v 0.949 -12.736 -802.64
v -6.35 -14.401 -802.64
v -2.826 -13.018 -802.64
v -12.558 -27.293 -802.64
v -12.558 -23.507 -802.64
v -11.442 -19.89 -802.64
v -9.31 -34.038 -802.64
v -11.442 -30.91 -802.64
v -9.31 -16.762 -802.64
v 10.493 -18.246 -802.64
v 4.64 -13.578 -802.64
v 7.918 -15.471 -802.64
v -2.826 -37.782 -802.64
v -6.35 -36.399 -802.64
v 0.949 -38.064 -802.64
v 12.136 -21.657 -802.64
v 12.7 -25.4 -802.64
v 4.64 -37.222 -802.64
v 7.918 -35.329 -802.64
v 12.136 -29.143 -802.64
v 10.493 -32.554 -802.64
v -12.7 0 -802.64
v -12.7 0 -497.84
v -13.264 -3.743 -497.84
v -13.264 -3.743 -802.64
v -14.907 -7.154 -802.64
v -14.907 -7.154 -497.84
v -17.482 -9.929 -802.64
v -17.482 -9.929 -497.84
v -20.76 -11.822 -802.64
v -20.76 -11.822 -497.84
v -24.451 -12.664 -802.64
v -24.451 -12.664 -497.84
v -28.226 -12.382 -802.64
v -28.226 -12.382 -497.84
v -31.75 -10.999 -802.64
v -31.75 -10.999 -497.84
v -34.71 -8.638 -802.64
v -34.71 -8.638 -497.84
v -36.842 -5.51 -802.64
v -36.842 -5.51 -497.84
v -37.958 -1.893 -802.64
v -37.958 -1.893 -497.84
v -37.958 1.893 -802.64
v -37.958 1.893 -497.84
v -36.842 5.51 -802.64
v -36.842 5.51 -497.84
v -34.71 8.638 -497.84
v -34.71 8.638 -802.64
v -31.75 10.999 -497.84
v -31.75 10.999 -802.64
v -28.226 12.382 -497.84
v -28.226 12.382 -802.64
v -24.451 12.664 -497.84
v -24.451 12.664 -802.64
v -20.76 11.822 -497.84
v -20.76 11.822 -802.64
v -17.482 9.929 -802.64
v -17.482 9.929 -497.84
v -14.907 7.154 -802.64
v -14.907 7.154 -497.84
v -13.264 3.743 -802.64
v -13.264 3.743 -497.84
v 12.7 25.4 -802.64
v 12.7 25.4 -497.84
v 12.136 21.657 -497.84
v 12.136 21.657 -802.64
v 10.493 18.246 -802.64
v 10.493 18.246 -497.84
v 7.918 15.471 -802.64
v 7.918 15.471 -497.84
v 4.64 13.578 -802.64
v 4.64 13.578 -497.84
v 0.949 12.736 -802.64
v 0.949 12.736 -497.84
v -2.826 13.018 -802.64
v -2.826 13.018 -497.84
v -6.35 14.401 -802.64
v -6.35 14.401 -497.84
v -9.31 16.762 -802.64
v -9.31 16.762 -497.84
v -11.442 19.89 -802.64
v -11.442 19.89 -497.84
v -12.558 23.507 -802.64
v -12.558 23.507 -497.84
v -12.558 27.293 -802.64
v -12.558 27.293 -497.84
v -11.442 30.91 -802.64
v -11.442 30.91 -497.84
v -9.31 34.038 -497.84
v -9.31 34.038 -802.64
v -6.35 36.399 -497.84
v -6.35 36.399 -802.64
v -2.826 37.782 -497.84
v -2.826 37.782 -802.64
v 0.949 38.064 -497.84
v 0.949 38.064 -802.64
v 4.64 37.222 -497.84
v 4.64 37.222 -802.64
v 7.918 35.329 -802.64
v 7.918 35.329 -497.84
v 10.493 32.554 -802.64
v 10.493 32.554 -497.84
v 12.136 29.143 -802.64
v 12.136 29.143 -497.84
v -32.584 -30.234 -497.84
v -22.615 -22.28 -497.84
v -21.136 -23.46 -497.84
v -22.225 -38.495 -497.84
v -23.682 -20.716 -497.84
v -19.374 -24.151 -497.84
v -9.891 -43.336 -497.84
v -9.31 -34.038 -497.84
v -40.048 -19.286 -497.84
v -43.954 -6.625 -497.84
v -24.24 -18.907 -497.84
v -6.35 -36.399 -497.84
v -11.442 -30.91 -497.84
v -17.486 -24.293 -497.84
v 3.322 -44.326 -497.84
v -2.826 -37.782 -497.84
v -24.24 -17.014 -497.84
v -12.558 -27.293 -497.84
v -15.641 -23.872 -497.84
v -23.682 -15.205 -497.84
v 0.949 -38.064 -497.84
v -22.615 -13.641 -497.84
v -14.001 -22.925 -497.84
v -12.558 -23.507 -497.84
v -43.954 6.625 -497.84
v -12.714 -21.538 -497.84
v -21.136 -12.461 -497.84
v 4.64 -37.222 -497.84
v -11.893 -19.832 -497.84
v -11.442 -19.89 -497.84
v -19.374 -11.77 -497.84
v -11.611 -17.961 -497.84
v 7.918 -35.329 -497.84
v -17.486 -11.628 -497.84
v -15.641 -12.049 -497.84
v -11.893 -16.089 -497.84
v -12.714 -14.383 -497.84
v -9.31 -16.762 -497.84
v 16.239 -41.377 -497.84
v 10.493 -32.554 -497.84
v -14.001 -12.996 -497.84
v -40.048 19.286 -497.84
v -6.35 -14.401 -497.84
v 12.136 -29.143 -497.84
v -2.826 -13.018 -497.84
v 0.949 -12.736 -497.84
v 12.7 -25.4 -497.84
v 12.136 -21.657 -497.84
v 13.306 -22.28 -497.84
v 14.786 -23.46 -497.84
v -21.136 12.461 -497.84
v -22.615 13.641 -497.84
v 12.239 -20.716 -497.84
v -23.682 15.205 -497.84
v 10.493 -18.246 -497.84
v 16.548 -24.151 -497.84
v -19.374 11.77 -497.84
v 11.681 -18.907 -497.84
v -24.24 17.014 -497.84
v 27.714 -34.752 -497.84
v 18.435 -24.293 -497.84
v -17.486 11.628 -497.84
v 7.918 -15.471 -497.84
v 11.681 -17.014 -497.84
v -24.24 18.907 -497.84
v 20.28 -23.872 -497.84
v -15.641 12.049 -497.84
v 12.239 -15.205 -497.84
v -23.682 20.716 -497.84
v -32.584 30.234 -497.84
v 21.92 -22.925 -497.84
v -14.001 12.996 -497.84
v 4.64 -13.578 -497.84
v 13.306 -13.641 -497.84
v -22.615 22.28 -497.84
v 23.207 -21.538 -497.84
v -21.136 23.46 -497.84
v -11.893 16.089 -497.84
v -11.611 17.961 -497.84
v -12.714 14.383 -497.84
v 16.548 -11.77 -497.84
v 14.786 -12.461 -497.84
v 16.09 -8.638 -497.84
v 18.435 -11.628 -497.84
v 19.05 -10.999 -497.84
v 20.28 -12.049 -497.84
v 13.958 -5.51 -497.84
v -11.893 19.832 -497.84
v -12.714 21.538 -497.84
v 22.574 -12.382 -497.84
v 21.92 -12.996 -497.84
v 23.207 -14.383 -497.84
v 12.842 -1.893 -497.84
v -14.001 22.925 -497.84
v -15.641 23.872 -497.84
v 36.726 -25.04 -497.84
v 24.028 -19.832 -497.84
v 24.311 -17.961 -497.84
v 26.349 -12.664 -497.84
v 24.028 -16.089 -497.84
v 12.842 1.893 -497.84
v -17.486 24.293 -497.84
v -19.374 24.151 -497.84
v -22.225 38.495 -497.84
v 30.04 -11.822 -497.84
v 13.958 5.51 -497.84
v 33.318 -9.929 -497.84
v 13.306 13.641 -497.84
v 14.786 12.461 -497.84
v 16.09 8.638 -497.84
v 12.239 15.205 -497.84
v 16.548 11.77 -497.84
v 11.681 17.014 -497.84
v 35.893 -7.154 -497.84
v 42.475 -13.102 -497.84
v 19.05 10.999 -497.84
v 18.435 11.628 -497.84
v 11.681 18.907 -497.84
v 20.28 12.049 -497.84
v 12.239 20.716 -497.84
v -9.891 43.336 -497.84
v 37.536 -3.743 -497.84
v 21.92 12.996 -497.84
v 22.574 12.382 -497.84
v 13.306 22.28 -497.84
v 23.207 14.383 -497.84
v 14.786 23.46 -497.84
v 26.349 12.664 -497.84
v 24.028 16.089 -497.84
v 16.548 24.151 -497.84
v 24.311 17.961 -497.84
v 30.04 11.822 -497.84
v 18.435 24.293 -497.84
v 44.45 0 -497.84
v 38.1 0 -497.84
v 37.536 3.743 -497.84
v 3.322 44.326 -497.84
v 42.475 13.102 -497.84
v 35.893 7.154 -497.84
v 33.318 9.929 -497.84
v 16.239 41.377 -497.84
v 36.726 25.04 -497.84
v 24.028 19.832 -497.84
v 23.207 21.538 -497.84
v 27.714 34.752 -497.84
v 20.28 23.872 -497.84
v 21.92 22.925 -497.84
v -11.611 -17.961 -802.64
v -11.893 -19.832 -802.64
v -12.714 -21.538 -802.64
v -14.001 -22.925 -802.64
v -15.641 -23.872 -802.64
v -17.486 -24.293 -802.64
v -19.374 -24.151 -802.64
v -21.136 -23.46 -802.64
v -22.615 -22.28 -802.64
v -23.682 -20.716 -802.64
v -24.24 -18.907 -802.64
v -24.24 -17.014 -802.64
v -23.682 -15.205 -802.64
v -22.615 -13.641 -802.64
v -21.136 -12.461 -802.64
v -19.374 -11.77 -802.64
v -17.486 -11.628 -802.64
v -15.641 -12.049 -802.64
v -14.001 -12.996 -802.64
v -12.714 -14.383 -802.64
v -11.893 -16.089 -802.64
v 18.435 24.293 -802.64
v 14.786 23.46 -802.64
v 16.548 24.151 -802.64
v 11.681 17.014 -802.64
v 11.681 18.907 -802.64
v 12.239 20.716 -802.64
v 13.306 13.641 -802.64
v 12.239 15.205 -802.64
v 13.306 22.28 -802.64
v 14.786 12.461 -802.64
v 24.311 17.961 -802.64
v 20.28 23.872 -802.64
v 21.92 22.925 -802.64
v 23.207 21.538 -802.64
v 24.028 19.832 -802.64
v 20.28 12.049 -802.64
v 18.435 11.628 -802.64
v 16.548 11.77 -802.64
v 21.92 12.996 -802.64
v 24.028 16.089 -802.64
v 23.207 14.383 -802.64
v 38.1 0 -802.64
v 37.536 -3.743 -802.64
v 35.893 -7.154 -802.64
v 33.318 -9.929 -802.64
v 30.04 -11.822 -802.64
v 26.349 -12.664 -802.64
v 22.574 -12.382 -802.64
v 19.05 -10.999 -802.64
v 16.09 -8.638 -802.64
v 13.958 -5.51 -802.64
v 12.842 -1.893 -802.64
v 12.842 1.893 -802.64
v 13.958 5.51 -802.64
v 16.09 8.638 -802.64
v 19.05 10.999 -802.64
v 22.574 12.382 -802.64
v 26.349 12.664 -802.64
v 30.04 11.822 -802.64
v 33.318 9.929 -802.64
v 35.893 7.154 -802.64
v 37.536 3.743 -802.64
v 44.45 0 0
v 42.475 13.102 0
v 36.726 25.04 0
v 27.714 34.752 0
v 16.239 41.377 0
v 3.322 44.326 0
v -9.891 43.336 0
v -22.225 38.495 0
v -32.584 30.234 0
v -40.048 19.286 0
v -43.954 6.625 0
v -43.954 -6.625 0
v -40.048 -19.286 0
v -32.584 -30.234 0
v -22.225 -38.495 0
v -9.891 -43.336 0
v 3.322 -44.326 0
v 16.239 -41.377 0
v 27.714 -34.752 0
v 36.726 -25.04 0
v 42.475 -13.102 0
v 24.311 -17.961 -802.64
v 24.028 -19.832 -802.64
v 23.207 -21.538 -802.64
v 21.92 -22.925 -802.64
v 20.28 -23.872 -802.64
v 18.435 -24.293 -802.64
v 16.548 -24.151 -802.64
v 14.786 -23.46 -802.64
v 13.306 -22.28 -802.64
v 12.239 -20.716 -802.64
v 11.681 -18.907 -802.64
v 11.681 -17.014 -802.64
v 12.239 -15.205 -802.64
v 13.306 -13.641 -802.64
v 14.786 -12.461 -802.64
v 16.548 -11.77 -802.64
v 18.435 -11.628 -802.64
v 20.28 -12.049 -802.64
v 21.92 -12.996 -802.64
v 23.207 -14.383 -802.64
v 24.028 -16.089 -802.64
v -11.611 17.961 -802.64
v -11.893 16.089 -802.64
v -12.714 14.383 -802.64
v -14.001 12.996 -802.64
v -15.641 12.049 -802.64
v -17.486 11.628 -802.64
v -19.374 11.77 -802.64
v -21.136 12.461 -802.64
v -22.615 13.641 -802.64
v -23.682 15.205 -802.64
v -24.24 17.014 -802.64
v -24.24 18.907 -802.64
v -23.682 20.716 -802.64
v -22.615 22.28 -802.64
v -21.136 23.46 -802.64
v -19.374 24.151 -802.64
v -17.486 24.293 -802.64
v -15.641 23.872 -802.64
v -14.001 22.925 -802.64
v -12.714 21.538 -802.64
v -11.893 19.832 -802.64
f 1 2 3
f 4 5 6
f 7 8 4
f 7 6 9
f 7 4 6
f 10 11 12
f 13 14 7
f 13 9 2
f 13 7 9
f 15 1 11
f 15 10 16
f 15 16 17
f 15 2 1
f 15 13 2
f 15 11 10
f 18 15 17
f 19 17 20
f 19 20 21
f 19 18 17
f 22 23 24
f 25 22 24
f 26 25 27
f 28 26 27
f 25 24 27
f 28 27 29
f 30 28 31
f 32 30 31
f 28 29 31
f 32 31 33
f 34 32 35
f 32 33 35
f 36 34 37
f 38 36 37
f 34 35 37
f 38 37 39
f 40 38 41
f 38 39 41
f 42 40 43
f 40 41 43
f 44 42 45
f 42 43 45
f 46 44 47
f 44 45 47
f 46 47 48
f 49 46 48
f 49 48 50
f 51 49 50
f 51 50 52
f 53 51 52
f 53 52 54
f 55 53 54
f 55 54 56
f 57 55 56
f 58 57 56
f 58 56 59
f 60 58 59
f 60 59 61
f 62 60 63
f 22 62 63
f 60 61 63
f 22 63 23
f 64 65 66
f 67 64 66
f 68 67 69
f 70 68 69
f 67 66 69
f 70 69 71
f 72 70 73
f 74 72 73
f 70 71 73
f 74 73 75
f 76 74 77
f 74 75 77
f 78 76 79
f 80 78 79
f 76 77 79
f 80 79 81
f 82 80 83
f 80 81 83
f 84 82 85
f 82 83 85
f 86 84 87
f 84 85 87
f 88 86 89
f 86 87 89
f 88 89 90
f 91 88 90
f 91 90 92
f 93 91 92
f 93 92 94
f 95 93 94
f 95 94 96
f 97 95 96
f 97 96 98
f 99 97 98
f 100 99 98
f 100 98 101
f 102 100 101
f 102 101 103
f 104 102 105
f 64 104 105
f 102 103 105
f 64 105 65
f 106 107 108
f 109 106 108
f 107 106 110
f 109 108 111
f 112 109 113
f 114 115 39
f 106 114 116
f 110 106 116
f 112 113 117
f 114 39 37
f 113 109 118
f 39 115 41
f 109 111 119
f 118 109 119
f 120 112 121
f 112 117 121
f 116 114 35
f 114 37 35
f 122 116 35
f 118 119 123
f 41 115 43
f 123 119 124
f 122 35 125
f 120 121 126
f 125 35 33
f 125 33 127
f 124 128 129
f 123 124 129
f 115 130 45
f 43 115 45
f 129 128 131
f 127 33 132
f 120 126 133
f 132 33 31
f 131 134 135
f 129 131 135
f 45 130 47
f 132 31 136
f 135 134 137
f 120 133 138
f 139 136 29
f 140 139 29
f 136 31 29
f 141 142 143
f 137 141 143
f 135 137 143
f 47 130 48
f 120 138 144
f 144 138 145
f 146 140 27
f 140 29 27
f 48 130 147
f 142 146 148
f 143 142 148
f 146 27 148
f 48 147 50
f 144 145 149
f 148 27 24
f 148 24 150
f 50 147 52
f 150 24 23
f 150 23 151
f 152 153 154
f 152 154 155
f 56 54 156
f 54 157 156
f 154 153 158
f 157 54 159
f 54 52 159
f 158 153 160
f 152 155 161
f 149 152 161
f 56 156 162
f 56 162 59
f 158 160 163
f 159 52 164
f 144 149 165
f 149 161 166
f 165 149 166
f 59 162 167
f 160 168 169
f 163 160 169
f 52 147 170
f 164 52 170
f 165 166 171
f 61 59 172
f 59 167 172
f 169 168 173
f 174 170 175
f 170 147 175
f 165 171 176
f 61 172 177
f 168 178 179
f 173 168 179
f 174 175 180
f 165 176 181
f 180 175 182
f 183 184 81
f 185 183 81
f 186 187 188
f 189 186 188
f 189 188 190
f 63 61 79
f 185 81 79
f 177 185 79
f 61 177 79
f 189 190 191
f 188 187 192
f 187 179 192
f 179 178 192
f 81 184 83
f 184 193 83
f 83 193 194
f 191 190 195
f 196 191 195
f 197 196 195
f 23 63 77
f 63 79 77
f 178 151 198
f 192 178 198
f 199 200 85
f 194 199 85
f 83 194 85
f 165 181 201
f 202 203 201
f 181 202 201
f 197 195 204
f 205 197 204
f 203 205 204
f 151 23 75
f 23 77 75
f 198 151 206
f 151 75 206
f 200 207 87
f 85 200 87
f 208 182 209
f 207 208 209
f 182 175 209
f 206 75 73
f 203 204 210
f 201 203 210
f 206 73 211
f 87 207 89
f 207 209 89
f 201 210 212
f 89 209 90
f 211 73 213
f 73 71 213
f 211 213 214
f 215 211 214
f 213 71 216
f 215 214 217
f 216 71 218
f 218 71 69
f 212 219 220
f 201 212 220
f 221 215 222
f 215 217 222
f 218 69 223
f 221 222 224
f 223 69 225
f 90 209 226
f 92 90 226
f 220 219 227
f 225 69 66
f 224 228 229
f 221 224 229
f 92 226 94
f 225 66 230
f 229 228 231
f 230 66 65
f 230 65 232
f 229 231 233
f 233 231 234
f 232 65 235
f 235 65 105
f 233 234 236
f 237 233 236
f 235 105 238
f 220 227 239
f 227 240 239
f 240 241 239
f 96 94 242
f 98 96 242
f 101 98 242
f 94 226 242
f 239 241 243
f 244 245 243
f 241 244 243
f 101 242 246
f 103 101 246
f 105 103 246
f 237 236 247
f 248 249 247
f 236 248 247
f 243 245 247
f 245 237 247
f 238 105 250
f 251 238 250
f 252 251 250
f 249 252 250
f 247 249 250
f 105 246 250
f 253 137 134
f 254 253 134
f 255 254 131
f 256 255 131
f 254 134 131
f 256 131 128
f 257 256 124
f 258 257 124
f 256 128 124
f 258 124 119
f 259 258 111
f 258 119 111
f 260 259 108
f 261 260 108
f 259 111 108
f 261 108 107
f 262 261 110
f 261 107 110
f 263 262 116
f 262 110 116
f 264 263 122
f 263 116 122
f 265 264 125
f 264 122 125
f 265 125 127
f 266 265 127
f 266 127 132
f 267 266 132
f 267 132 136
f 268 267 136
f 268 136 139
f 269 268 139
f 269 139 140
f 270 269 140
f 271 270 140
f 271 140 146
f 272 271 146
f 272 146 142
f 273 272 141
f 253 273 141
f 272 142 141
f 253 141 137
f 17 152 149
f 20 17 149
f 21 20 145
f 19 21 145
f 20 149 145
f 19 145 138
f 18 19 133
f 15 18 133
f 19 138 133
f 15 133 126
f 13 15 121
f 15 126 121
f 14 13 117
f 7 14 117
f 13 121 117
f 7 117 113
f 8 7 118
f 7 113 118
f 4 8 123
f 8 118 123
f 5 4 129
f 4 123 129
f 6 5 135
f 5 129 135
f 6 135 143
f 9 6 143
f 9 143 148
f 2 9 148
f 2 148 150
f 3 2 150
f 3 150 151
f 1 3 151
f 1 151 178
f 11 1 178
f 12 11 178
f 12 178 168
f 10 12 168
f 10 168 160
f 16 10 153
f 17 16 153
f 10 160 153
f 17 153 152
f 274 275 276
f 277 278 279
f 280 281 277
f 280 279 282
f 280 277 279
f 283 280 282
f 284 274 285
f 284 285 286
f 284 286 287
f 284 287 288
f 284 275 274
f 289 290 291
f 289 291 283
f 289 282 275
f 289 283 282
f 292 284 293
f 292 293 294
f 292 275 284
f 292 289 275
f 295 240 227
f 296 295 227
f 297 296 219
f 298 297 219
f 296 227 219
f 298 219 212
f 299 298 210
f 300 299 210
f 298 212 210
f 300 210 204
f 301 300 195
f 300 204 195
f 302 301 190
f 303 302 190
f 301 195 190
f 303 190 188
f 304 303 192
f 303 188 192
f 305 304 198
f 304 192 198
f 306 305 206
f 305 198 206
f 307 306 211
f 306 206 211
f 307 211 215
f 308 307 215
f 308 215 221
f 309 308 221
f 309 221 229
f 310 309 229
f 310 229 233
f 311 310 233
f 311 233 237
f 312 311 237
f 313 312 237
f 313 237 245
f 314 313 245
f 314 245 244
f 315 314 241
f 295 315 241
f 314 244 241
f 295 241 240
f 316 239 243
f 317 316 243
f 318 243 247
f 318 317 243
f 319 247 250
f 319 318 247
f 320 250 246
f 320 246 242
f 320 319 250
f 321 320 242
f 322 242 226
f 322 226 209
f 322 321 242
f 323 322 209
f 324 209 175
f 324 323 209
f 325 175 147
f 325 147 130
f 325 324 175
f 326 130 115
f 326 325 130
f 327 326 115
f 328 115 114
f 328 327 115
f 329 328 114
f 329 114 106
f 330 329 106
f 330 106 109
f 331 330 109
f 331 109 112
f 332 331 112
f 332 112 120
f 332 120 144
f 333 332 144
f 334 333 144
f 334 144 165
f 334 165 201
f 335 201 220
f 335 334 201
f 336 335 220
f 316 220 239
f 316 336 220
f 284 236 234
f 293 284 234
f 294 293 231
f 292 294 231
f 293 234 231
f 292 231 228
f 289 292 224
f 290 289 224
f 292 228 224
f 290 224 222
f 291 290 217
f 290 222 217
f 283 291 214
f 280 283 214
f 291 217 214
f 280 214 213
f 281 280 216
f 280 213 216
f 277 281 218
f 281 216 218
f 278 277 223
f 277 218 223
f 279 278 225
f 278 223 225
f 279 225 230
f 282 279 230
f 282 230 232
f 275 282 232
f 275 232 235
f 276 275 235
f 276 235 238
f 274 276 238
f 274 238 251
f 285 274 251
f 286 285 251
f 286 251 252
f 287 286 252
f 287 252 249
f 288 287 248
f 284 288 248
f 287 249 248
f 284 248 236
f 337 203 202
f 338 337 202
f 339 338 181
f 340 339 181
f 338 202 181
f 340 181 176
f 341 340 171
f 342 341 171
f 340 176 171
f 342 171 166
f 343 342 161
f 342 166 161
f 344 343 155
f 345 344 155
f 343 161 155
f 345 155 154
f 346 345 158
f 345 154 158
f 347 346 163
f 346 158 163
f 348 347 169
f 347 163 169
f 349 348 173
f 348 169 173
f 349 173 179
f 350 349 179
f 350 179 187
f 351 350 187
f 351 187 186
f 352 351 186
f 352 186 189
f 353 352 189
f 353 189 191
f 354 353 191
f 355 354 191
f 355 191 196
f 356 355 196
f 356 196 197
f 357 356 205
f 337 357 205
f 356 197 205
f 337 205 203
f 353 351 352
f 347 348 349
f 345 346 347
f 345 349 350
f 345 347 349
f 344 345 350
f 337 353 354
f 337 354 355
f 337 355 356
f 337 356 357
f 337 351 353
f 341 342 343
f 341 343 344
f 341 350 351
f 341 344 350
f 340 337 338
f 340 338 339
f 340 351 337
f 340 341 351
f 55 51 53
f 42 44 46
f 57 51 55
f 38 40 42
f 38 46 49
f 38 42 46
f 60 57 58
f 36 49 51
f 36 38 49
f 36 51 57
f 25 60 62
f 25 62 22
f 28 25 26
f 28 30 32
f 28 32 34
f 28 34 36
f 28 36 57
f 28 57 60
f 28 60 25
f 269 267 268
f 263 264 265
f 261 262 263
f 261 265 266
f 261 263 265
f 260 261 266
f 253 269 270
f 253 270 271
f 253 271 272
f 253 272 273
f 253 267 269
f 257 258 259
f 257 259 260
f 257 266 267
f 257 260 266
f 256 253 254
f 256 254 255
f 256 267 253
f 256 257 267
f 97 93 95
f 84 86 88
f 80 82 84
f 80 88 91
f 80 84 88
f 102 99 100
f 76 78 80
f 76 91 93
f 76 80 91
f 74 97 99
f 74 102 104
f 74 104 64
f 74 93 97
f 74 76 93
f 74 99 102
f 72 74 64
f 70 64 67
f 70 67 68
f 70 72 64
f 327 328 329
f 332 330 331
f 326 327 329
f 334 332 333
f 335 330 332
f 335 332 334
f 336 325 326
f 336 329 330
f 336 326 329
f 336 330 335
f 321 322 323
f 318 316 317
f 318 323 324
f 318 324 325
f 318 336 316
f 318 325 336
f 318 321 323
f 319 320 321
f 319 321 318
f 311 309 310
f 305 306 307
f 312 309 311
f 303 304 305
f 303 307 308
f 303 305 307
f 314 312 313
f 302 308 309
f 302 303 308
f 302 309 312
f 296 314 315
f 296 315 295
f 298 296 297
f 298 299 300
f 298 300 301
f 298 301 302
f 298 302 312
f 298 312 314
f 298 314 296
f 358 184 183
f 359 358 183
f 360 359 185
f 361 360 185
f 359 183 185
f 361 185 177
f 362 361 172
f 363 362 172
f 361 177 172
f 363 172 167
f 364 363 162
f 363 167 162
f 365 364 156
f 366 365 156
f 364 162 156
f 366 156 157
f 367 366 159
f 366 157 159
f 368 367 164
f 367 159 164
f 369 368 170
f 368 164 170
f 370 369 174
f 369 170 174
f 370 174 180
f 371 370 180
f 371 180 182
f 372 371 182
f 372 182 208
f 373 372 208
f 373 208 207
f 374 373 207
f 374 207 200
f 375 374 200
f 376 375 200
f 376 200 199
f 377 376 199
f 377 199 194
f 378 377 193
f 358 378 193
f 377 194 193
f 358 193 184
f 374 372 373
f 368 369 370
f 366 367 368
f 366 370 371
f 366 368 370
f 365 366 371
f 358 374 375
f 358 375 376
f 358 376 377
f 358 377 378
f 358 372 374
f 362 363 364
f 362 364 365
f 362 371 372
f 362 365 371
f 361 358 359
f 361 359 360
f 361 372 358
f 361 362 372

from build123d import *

# Parameters (mm, degrees)
F0_R     = 44.45
F1_DEPTH = 497.84
F2_R     = 12.7
F2_R_2   = 6.35
F3_DEPTH = 304.8


with BuildPart() as f1:
    # F0 (on Top) → F1 (new body)
    with BuildSketch(Plane.XY):
        Circle(F0_R)
    extrude(amount=-F1_DEPTH)

    # F2 (on face) → F3 (join)
    with BuildSketch(Plane(origin=(0, 0, -497.84), x_dir=(1, 0, 0), z_dir=(0, 0, -1))):
        with Locations((0, 25.4)):
            Circle(F2_R)
        with Locations((0, -25.4)):
            Circle(F2_R)
        with Locations((-25.4, 0)):
            Circle(F2_R)
        with Locations((25.4, 0)):
            Circle(F2_R)
        with Locations((-17.960512, 17.960512)):
            Circle(F2_R_2)
        with Locations((17.960512, 17.960512)):
            Circle(F2_R_2)
        with Locations((17.960512, -17.960512)):
            Circle(F2_R_2)
        with Locations((-17.960512, -17.960512)):
            Circle(F2_R_2)
    extrude(amount=F3_DEPTH)


solid = f1.part
